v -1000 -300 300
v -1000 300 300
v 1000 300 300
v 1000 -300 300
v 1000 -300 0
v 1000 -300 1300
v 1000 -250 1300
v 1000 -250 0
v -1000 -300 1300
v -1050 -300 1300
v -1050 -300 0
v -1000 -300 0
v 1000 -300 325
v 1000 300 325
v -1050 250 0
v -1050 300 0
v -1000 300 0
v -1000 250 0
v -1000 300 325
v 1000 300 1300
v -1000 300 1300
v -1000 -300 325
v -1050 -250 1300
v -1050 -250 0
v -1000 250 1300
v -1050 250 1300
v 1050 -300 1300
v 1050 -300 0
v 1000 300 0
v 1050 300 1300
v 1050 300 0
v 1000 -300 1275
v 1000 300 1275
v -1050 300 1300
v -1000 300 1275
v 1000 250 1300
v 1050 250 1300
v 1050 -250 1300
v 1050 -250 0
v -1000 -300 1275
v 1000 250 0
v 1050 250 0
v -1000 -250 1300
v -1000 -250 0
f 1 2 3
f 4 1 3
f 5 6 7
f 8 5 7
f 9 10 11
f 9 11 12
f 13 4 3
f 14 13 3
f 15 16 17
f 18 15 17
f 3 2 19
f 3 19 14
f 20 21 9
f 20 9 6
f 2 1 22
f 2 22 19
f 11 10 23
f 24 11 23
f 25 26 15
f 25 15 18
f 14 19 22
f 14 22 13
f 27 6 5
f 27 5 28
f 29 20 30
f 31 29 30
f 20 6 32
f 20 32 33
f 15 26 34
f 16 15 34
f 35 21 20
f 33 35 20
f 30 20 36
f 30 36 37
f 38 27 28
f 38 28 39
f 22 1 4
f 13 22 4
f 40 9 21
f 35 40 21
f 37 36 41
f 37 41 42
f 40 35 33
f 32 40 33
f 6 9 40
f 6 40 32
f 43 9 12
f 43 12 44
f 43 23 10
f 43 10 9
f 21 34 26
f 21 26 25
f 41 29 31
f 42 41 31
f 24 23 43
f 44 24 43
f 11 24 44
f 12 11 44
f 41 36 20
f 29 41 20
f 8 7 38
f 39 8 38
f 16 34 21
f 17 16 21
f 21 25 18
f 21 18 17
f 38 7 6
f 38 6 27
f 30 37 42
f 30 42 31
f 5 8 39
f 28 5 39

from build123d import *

# Parameters (mm, degrees)
F2_W     = 50
F2_H     = 50
F5_DEPTH = 1300
F3_W     = 2000
F3_H     = 600
F6_DEPTH = 25
F4_W     = 2000
F4_H     = 600
F7_DEPTH = 25


with BuildPart() as f5:
    # F2 (on Top) → F5 (new body)
    with BuildSketch(Plane.XY):
        with Locations((-1025, 275)):
            Rectangle(F2_W, F2_H)
        with Locations((-1025, -275)):
            Rectangle(F2_W, F2_H)
        with Locations((1025, -275)):
            Rectangle(F2_W, F2_H)
        with Locations((1025, 275)):
            Rectangle(F2_W, F2_H)
    extrude(amount=F5_DEPTH)


with BuildPart() as f6:
    # F3 (on offset) → F6 (new body)
    with BuildSketch(Plane.XY.offset(300)):
        Rectangle(F3_W, F3_H)
    extrude(amount=F6_DEPTH)


with BuildPart() as f7:
    # F4 (on offset) → F7 (new body)
    with BuildSketch(Plane.XY.offset(1300)):
        Rectangle(F4_W, F4_H)
    extrude(amount=-F7_DEPTH)


solid = Compound([f5.part, f6.part, f7.part])
